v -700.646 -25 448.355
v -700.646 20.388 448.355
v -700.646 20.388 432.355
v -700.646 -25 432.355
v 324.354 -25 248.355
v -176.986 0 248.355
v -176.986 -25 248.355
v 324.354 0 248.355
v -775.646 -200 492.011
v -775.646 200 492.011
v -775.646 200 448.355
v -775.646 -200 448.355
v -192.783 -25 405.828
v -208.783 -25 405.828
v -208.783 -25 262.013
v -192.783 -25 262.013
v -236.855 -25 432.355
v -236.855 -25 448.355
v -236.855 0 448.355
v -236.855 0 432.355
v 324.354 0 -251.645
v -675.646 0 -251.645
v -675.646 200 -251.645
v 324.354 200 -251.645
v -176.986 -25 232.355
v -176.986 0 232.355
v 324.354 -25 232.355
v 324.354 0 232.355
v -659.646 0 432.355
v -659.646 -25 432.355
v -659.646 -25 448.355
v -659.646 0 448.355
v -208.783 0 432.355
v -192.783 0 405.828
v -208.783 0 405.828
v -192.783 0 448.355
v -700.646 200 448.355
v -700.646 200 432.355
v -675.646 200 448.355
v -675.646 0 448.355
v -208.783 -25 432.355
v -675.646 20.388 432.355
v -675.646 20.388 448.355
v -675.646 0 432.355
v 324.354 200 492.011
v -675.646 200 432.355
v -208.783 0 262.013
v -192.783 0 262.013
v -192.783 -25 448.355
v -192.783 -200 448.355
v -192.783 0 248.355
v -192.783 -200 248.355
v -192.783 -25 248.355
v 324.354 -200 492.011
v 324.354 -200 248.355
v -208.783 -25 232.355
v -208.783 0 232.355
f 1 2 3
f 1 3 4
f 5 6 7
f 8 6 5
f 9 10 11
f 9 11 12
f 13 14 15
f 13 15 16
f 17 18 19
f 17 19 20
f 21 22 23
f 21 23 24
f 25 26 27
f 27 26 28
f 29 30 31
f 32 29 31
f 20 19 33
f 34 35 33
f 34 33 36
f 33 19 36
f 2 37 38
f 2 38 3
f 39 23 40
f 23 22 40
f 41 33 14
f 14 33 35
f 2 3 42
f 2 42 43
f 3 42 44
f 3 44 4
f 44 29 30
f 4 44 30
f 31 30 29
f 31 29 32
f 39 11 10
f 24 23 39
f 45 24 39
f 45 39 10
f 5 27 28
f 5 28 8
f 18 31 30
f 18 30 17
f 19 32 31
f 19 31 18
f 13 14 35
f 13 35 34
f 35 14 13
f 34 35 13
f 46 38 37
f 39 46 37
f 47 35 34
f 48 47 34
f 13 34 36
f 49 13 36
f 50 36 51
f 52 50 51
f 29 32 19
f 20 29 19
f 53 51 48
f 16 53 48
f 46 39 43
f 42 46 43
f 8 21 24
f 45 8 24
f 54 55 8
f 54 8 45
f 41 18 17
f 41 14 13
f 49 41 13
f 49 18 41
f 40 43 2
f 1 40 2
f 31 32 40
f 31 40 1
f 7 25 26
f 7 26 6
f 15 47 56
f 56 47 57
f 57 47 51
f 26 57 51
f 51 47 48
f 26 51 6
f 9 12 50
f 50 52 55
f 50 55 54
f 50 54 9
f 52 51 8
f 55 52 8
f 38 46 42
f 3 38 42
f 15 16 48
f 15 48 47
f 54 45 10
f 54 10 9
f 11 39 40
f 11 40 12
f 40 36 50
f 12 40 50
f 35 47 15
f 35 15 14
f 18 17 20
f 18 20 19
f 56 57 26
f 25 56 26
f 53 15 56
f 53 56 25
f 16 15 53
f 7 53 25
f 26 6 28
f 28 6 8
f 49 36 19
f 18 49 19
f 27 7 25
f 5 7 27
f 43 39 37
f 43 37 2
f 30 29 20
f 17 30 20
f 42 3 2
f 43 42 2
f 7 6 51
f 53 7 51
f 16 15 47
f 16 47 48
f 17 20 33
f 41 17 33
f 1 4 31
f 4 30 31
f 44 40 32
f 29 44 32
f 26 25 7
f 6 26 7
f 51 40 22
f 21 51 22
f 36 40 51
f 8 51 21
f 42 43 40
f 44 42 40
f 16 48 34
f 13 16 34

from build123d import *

# Parameters (mm, degrees)
F0_W          = 482.8630983498
F0_H          = 200
F1_DEPTH      = 200
F0_H_2        = 43.6560429633
F2_DEPTH      = 200
F2_DEPTH_BACK = 200
F3_W          = 501.3401806686
F3_H          = 16
F4_DEPTH      = 25
F3_W_2        = 422.7913618088
F3_W_3        = 16
F3_H_2        = 143.8153088093
F3_W_4        = 15.9996449616
F5_DEPTH      = 25
F6_W          = 400
F6_H          = 43.6560429633
F7_DEPTH      = 100
F8_W          = 20.3876569867
F8_H          = 16
F5_FACE_W     = 25
F5_FACE_H     = 16
F9_DEPTH      = 25
F8_W_2        = 179.6123430133
F10_DEPTH     = 25


with BuildPart() as f1:
    # F0 (on Front) → F1 (new body)
    with BuildSketch(Plane.XZ):
        Polygon((-192.7827596664, 248.3553551137), (-675.6458580162, 248.3553551137), (-675.6458580162, -251.6446448863), (324.3541419838, -251.6446448863), (324.3541419838, 248.3553551137), align=None)
        with Locations((-434.2143088413, 348.3553551137)):
            Rectangle(F0_W, F0_H)
    extrude(amount=-F1_DEPTH)

    # F0 (on Front) → F2 (join, two sides)
    with BuildSketch(Plane.XZ) as f2_sk:
        with Locations((-434.2143088413, 470.1833765954)):
            Rectangle(F0_W, F0_H_2)
        Polygon((-192.7827596664, 448.3553551137), (-192.7827596664, 248.3553551137), (324.3541419838, 248.3553551137), (324.3541419838, 492.011398077), (-192.7827596664, 492.011398077), align=None)
    extrude(amount=F2_DEPTH)
    extrude(f2_sk.sketch, amount=-F2_DEPTH_BACK)

    # F6 (on face) → F7 (join)
    with BuildSketch(Plane(origin=(-675.6458580162, 0, 0), x_dir=(0, -1, 0), z_dir=(-1, 0, 0))):
        with Locations((0, 470.1833765954)):
            Rectangle(F6_W, F6_H)
    extrude(amount=F7_DEPTH)


with BuildPart() as f4:
    # F3 (on face) → F4 (new body)
    with BuildSketch(Plane.XZ):
        with Locations((73.6840516495, 240.3553551137)):
            Rectangle(F3_W, F3_H)
    extrude(amount=F4_DEPTH)


with BuildPart() as f4b:
    # F3 (on face) → F4, piece 2 (new body)
    with BuildSketch(Plane.XZ):
        with Locations((-448.2505321503, 440.3553551137)):
            Rectangle(F3_W_2, F3_H)
    extrude(amount=F4_DEPTH)


with BuildPart() as f4c:
    # F3 (on face) → F4, piece 3 (new body)
    with BuildSketch(Plane.XZ):
        with Locations((-200.7827596664, 333.9206725359)):
            Rectangle(F3_W_3, F3_H_2)
    extrude(amount=F4_DEPTH)


with BuildPart() as f5:
    # F3 (on face) → F5 (new body)
    with BuildSketch(Plane.XZ):
        with Locations((-667.6460355355, 440.3553551137)):
            Rectangle(F3_W_4, F3_H)
    extrude(amount=F5_DEPTH)

    # F8 (on face) + F5_face (on face) → F9 (join)
    with BuildSketch(Plane(origin=(-675.6458580162, 0, 0), x_dir=(0, -1, 0), z_dir=(-1, 0, 0))):
        with Locations((-10.1938284934, 440.3553551137)):
            Rectangle(F8_W, F8_H)
    with BuildSketch(Plane(origin=(-675.6458580162, -12.5, 440.3553551137), x_dir=(0, -1, 0), z_dir=(-1, 0, 0))):
        Rectangle(F5_FACE_W, F5_FACE_H)
    extrude(amount=F9_DEPTH)


with BuildPart() as f5b:
    # F3 (on face) → F5, piece 2 (new body)
    with BuildSketch(Plane.XZ):
        Polygon((-192.7827596664, 448.3553551137), (-236.8548512459, 448.3553551137), (-236.8548512459, 432.3553551137), (-208.7827596664, 432.3553551137), (-208.7827596664, 405.8283269405), (-192.7827596664, 405.8283269405), (-192.7827596664, 423.3553551137), (-192.7827596664, 432.3553551137), align=None)
    extrude(amount=F5_DEPTH)


with BuildPart() as f5c:
    # F3 (on face) → F5, piece 3 (new body)
    with BuildSketch(Plane.XZ):
        Polygon((-192.7827596664, 232.3553551137), (-176.9860386848, 232.3553551137), (-176.9860386848, 248.3553551137), (-192.7827596664, 248.3553551137), (-192.7827596664, 262.0130181313), (-208.7827596664, 262.0130181313), (-208.7827596664, 232.3553551137), align=None)
    extrude(amount=F5_DEPTH)


with BuildPart() as f10:
    # F8 (on face) → F10 (new body)
    with BuildSketch(Plane(origin=(-675.6458580162, 0, 0), x_dir=(0, -1, 0), z_dir=(-1, 0, 0))):
        with Locations((-110.1938284934, 440.3553551137)):
            Rectangle(F8_W_2, F8_H)
    extrude(amount=F10_DEPTH)


solid = Compound([f1.part, f4.part, f4b.part, f4c.part, f5.part, f5b.part, f5c.part, f10.part])
